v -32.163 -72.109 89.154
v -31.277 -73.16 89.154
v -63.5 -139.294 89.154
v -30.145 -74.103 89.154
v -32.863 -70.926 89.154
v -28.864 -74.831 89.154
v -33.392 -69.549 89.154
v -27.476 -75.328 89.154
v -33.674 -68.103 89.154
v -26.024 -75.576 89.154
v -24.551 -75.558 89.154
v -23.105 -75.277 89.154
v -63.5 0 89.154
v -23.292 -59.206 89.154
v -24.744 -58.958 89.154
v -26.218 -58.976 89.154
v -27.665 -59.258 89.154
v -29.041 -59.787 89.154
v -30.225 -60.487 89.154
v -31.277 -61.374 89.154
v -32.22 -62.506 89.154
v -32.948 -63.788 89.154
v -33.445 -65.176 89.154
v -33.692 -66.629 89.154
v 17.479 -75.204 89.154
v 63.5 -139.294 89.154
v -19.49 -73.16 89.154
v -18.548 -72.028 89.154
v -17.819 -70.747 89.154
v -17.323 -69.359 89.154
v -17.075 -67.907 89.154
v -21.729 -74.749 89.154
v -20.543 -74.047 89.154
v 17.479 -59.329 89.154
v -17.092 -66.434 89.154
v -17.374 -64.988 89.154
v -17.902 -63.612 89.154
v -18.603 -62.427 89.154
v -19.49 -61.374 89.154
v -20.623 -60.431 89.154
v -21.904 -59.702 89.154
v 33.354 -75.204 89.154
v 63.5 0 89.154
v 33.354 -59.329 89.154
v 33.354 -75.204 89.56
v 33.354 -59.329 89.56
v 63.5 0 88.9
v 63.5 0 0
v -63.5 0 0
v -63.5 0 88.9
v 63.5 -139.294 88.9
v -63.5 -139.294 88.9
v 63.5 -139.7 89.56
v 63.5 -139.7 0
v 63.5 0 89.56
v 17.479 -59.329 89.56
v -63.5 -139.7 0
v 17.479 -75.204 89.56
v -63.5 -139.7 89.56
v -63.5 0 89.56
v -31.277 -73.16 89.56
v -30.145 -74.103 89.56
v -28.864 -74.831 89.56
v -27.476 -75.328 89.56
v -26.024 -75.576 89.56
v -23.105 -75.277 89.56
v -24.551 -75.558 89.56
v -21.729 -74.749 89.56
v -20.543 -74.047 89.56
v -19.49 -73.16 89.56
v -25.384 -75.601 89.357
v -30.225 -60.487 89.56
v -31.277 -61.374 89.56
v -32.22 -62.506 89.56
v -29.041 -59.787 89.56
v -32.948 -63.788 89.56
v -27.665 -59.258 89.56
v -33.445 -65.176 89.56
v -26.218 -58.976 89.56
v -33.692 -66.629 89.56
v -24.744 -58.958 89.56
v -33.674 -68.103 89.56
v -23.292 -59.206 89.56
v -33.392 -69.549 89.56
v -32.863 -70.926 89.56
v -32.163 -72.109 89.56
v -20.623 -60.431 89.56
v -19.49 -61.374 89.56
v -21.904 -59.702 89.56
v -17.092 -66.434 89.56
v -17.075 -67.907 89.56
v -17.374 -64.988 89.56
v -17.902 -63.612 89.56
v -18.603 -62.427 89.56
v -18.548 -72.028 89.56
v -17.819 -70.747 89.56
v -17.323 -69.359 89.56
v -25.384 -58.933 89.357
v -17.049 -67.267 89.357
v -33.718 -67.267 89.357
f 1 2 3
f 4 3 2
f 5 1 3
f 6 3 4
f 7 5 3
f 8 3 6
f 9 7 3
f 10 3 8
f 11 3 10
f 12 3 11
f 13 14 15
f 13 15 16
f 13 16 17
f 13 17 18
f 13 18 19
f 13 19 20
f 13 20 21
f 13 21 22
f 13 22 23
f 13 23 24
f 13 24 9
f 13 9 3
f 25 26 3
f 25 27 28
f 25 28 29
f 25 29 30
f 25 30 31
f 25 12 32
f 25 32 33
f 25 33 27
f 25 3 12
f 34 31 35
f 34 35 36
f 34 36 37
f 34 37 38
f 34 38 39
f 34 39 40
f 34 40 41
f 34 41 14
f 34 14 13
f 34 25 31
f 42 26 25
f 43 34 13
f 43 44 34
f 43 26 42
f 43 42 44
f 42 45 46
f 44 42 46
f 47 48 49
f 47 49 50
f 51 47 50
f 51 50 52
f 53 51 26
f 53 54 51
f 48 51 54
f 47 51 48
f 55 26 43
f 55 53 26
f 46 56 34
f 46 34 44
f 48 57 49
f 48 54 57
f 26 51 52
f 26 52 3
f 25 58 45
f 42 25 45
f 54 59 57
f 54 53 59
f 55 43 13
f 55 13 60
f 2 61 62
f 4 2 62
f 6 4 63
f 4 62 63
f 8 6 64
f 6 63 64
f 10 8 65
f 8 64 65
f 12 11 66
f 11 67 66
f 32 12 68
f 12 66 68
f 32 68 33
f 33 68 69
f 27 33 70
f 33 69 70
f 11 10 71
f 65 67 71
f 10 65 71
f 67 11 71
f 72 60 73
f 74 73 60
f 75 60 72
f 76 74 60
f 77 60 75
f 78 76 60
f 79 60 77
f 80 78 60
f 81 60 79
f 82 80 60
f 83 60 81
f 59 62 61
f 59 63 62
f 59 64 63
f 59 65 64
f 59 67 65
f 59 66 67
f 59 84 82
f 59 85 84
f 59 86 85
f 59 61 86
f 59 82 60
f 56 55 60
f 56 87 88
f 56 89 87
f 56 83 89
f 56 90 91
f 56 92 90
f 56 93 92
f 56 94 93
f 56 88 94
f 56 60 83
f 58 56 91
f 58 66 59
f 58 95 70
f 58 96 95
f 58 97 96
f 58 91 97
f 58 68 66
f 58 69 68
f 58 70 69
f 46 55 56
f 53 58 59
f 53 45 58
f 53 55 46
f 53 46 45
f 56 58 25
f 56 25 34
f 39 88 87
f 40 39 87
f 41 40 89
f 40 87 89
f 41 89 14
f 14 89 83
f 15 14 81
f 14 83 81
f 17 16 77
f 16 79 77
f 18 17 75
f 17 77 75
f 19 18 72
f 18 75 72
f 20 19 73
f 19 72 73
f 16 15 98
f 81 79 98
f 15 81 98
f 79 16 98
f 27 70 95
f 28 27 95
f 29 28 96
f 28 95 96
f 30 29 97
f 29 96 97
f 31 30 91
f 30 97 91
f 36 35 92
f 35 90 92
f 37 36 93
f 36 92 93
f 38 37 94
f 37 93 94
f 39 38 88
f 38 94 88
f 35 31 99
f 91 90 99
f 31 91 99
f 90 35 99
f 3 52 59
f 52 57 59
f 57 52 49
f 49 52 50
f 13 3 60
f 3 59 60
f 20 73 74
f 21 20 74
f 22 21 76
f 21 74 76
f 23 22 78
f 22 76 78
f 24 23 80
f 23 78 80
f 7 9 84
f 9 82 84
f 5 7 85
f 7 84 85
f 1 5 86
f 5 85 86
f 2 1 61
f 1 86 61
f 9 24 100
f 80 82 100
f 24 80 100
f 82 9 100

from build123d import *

# Parameters (mm, degrees)
F1_DEPTH = 63.5
F2_W     = 15.875
F2_H     = 15.875
F3_DEPTH = 0.4064


# Not quite as in the source:
# - the dataset's text gives a spline's control points without its knots; the knots are read off the source's solid


with BuildPart() as f1:
    # F0 (on Right) → F1 (new body, symmetric)
    with BuildSketch(Plane.YZ):
        Polygon((-139.7, 0), (0, 0), (0, 88.9), (-139.2936, 88.9), (-139.2936, 89.154), (0, 89.154), (0, 89.5604), (-139.7, 89.5604), align=None)
    extrude(amount=F1_DEPTH, both=True)

    # F2 (on face) → F3 (cut, through all)
    with BuildSketch(Plane.XY.offset(89.5604)):
        with Locations((25.4164397061, -67.2669539907)):
            Rectangle(F2_W, F2_H)
        with BuildLine():
            add(Edge.make_bspline(
                [(-19.4903538939, -61.3735951907), (-21.0330482939, -59.8307229907), (-23.2013954939, -58.9325789907), (-25.3835602939, -58.9325789907)],
                knots=[7, 7, 7, 7, 8, 8, 8, 8], degree=3))
            add(Edge.make_bspline(
                [(-25.3835602939, -58.9325789907), (-27.5652932939, -58.9325789907), (-29.7339960939, -59.8307229907), (-31.2766904939, -61.3735951907)],
                knots=[0, 0, 0, 0, 1, 1, 1, 1], degree=3))
            add(Edge.make_bspline(
                [(-31.2766904939, -61.3735951907), (-32.8194356939, -62.9164927907), (-33.7179352939, -65.0849923907), (-33.7179352939, -67.2669539907), (-33.7179352939, -69.4487377907), (-32.8194356939, -71.6174151907), (-31.2766904939, -73.1601603907)],
                knots=[1, 1, 1, 1, 2, 2, 2, 3, 3, 3, 3], degree=3))
            add(Edge.make_bspline(
                [(-31.2766904939, -73.1601603907), (-29.7339960939, -74.7032103907), (-27.5652932939, -75.6013289907), (-25.3835602939, -75.6013289907), (-23.2013954939, -75.6013289907), (-21.0330482939, -74.7032103907), (-19.4903538939, -73.1601603907)],
                knots=[3, 3, 3, 3, 4, 4, 4, 5, 5, 5, 5], degree=3))
            add(Edge.make_bspline(
                [(-19.4903538939, -73.1601603907), (-17.9473038939, -71.6174151907), (-17.0491852939, -69.4487377907), (-17.0491852939, -67.2669539907), (-17.0491852939, -65.0849923907), (-17.9473038939, -62.9164927907), (-19.4903538939, -61.3735951907)],
                knots=[5, 5, 5, 5, 6, 6, 6, 7, 7, 7, 7], degree=3))
        make_face()
    extrude(amount=-F3_DEPTH, mode=Mode.SUBTRACT)


solid = f1.part
